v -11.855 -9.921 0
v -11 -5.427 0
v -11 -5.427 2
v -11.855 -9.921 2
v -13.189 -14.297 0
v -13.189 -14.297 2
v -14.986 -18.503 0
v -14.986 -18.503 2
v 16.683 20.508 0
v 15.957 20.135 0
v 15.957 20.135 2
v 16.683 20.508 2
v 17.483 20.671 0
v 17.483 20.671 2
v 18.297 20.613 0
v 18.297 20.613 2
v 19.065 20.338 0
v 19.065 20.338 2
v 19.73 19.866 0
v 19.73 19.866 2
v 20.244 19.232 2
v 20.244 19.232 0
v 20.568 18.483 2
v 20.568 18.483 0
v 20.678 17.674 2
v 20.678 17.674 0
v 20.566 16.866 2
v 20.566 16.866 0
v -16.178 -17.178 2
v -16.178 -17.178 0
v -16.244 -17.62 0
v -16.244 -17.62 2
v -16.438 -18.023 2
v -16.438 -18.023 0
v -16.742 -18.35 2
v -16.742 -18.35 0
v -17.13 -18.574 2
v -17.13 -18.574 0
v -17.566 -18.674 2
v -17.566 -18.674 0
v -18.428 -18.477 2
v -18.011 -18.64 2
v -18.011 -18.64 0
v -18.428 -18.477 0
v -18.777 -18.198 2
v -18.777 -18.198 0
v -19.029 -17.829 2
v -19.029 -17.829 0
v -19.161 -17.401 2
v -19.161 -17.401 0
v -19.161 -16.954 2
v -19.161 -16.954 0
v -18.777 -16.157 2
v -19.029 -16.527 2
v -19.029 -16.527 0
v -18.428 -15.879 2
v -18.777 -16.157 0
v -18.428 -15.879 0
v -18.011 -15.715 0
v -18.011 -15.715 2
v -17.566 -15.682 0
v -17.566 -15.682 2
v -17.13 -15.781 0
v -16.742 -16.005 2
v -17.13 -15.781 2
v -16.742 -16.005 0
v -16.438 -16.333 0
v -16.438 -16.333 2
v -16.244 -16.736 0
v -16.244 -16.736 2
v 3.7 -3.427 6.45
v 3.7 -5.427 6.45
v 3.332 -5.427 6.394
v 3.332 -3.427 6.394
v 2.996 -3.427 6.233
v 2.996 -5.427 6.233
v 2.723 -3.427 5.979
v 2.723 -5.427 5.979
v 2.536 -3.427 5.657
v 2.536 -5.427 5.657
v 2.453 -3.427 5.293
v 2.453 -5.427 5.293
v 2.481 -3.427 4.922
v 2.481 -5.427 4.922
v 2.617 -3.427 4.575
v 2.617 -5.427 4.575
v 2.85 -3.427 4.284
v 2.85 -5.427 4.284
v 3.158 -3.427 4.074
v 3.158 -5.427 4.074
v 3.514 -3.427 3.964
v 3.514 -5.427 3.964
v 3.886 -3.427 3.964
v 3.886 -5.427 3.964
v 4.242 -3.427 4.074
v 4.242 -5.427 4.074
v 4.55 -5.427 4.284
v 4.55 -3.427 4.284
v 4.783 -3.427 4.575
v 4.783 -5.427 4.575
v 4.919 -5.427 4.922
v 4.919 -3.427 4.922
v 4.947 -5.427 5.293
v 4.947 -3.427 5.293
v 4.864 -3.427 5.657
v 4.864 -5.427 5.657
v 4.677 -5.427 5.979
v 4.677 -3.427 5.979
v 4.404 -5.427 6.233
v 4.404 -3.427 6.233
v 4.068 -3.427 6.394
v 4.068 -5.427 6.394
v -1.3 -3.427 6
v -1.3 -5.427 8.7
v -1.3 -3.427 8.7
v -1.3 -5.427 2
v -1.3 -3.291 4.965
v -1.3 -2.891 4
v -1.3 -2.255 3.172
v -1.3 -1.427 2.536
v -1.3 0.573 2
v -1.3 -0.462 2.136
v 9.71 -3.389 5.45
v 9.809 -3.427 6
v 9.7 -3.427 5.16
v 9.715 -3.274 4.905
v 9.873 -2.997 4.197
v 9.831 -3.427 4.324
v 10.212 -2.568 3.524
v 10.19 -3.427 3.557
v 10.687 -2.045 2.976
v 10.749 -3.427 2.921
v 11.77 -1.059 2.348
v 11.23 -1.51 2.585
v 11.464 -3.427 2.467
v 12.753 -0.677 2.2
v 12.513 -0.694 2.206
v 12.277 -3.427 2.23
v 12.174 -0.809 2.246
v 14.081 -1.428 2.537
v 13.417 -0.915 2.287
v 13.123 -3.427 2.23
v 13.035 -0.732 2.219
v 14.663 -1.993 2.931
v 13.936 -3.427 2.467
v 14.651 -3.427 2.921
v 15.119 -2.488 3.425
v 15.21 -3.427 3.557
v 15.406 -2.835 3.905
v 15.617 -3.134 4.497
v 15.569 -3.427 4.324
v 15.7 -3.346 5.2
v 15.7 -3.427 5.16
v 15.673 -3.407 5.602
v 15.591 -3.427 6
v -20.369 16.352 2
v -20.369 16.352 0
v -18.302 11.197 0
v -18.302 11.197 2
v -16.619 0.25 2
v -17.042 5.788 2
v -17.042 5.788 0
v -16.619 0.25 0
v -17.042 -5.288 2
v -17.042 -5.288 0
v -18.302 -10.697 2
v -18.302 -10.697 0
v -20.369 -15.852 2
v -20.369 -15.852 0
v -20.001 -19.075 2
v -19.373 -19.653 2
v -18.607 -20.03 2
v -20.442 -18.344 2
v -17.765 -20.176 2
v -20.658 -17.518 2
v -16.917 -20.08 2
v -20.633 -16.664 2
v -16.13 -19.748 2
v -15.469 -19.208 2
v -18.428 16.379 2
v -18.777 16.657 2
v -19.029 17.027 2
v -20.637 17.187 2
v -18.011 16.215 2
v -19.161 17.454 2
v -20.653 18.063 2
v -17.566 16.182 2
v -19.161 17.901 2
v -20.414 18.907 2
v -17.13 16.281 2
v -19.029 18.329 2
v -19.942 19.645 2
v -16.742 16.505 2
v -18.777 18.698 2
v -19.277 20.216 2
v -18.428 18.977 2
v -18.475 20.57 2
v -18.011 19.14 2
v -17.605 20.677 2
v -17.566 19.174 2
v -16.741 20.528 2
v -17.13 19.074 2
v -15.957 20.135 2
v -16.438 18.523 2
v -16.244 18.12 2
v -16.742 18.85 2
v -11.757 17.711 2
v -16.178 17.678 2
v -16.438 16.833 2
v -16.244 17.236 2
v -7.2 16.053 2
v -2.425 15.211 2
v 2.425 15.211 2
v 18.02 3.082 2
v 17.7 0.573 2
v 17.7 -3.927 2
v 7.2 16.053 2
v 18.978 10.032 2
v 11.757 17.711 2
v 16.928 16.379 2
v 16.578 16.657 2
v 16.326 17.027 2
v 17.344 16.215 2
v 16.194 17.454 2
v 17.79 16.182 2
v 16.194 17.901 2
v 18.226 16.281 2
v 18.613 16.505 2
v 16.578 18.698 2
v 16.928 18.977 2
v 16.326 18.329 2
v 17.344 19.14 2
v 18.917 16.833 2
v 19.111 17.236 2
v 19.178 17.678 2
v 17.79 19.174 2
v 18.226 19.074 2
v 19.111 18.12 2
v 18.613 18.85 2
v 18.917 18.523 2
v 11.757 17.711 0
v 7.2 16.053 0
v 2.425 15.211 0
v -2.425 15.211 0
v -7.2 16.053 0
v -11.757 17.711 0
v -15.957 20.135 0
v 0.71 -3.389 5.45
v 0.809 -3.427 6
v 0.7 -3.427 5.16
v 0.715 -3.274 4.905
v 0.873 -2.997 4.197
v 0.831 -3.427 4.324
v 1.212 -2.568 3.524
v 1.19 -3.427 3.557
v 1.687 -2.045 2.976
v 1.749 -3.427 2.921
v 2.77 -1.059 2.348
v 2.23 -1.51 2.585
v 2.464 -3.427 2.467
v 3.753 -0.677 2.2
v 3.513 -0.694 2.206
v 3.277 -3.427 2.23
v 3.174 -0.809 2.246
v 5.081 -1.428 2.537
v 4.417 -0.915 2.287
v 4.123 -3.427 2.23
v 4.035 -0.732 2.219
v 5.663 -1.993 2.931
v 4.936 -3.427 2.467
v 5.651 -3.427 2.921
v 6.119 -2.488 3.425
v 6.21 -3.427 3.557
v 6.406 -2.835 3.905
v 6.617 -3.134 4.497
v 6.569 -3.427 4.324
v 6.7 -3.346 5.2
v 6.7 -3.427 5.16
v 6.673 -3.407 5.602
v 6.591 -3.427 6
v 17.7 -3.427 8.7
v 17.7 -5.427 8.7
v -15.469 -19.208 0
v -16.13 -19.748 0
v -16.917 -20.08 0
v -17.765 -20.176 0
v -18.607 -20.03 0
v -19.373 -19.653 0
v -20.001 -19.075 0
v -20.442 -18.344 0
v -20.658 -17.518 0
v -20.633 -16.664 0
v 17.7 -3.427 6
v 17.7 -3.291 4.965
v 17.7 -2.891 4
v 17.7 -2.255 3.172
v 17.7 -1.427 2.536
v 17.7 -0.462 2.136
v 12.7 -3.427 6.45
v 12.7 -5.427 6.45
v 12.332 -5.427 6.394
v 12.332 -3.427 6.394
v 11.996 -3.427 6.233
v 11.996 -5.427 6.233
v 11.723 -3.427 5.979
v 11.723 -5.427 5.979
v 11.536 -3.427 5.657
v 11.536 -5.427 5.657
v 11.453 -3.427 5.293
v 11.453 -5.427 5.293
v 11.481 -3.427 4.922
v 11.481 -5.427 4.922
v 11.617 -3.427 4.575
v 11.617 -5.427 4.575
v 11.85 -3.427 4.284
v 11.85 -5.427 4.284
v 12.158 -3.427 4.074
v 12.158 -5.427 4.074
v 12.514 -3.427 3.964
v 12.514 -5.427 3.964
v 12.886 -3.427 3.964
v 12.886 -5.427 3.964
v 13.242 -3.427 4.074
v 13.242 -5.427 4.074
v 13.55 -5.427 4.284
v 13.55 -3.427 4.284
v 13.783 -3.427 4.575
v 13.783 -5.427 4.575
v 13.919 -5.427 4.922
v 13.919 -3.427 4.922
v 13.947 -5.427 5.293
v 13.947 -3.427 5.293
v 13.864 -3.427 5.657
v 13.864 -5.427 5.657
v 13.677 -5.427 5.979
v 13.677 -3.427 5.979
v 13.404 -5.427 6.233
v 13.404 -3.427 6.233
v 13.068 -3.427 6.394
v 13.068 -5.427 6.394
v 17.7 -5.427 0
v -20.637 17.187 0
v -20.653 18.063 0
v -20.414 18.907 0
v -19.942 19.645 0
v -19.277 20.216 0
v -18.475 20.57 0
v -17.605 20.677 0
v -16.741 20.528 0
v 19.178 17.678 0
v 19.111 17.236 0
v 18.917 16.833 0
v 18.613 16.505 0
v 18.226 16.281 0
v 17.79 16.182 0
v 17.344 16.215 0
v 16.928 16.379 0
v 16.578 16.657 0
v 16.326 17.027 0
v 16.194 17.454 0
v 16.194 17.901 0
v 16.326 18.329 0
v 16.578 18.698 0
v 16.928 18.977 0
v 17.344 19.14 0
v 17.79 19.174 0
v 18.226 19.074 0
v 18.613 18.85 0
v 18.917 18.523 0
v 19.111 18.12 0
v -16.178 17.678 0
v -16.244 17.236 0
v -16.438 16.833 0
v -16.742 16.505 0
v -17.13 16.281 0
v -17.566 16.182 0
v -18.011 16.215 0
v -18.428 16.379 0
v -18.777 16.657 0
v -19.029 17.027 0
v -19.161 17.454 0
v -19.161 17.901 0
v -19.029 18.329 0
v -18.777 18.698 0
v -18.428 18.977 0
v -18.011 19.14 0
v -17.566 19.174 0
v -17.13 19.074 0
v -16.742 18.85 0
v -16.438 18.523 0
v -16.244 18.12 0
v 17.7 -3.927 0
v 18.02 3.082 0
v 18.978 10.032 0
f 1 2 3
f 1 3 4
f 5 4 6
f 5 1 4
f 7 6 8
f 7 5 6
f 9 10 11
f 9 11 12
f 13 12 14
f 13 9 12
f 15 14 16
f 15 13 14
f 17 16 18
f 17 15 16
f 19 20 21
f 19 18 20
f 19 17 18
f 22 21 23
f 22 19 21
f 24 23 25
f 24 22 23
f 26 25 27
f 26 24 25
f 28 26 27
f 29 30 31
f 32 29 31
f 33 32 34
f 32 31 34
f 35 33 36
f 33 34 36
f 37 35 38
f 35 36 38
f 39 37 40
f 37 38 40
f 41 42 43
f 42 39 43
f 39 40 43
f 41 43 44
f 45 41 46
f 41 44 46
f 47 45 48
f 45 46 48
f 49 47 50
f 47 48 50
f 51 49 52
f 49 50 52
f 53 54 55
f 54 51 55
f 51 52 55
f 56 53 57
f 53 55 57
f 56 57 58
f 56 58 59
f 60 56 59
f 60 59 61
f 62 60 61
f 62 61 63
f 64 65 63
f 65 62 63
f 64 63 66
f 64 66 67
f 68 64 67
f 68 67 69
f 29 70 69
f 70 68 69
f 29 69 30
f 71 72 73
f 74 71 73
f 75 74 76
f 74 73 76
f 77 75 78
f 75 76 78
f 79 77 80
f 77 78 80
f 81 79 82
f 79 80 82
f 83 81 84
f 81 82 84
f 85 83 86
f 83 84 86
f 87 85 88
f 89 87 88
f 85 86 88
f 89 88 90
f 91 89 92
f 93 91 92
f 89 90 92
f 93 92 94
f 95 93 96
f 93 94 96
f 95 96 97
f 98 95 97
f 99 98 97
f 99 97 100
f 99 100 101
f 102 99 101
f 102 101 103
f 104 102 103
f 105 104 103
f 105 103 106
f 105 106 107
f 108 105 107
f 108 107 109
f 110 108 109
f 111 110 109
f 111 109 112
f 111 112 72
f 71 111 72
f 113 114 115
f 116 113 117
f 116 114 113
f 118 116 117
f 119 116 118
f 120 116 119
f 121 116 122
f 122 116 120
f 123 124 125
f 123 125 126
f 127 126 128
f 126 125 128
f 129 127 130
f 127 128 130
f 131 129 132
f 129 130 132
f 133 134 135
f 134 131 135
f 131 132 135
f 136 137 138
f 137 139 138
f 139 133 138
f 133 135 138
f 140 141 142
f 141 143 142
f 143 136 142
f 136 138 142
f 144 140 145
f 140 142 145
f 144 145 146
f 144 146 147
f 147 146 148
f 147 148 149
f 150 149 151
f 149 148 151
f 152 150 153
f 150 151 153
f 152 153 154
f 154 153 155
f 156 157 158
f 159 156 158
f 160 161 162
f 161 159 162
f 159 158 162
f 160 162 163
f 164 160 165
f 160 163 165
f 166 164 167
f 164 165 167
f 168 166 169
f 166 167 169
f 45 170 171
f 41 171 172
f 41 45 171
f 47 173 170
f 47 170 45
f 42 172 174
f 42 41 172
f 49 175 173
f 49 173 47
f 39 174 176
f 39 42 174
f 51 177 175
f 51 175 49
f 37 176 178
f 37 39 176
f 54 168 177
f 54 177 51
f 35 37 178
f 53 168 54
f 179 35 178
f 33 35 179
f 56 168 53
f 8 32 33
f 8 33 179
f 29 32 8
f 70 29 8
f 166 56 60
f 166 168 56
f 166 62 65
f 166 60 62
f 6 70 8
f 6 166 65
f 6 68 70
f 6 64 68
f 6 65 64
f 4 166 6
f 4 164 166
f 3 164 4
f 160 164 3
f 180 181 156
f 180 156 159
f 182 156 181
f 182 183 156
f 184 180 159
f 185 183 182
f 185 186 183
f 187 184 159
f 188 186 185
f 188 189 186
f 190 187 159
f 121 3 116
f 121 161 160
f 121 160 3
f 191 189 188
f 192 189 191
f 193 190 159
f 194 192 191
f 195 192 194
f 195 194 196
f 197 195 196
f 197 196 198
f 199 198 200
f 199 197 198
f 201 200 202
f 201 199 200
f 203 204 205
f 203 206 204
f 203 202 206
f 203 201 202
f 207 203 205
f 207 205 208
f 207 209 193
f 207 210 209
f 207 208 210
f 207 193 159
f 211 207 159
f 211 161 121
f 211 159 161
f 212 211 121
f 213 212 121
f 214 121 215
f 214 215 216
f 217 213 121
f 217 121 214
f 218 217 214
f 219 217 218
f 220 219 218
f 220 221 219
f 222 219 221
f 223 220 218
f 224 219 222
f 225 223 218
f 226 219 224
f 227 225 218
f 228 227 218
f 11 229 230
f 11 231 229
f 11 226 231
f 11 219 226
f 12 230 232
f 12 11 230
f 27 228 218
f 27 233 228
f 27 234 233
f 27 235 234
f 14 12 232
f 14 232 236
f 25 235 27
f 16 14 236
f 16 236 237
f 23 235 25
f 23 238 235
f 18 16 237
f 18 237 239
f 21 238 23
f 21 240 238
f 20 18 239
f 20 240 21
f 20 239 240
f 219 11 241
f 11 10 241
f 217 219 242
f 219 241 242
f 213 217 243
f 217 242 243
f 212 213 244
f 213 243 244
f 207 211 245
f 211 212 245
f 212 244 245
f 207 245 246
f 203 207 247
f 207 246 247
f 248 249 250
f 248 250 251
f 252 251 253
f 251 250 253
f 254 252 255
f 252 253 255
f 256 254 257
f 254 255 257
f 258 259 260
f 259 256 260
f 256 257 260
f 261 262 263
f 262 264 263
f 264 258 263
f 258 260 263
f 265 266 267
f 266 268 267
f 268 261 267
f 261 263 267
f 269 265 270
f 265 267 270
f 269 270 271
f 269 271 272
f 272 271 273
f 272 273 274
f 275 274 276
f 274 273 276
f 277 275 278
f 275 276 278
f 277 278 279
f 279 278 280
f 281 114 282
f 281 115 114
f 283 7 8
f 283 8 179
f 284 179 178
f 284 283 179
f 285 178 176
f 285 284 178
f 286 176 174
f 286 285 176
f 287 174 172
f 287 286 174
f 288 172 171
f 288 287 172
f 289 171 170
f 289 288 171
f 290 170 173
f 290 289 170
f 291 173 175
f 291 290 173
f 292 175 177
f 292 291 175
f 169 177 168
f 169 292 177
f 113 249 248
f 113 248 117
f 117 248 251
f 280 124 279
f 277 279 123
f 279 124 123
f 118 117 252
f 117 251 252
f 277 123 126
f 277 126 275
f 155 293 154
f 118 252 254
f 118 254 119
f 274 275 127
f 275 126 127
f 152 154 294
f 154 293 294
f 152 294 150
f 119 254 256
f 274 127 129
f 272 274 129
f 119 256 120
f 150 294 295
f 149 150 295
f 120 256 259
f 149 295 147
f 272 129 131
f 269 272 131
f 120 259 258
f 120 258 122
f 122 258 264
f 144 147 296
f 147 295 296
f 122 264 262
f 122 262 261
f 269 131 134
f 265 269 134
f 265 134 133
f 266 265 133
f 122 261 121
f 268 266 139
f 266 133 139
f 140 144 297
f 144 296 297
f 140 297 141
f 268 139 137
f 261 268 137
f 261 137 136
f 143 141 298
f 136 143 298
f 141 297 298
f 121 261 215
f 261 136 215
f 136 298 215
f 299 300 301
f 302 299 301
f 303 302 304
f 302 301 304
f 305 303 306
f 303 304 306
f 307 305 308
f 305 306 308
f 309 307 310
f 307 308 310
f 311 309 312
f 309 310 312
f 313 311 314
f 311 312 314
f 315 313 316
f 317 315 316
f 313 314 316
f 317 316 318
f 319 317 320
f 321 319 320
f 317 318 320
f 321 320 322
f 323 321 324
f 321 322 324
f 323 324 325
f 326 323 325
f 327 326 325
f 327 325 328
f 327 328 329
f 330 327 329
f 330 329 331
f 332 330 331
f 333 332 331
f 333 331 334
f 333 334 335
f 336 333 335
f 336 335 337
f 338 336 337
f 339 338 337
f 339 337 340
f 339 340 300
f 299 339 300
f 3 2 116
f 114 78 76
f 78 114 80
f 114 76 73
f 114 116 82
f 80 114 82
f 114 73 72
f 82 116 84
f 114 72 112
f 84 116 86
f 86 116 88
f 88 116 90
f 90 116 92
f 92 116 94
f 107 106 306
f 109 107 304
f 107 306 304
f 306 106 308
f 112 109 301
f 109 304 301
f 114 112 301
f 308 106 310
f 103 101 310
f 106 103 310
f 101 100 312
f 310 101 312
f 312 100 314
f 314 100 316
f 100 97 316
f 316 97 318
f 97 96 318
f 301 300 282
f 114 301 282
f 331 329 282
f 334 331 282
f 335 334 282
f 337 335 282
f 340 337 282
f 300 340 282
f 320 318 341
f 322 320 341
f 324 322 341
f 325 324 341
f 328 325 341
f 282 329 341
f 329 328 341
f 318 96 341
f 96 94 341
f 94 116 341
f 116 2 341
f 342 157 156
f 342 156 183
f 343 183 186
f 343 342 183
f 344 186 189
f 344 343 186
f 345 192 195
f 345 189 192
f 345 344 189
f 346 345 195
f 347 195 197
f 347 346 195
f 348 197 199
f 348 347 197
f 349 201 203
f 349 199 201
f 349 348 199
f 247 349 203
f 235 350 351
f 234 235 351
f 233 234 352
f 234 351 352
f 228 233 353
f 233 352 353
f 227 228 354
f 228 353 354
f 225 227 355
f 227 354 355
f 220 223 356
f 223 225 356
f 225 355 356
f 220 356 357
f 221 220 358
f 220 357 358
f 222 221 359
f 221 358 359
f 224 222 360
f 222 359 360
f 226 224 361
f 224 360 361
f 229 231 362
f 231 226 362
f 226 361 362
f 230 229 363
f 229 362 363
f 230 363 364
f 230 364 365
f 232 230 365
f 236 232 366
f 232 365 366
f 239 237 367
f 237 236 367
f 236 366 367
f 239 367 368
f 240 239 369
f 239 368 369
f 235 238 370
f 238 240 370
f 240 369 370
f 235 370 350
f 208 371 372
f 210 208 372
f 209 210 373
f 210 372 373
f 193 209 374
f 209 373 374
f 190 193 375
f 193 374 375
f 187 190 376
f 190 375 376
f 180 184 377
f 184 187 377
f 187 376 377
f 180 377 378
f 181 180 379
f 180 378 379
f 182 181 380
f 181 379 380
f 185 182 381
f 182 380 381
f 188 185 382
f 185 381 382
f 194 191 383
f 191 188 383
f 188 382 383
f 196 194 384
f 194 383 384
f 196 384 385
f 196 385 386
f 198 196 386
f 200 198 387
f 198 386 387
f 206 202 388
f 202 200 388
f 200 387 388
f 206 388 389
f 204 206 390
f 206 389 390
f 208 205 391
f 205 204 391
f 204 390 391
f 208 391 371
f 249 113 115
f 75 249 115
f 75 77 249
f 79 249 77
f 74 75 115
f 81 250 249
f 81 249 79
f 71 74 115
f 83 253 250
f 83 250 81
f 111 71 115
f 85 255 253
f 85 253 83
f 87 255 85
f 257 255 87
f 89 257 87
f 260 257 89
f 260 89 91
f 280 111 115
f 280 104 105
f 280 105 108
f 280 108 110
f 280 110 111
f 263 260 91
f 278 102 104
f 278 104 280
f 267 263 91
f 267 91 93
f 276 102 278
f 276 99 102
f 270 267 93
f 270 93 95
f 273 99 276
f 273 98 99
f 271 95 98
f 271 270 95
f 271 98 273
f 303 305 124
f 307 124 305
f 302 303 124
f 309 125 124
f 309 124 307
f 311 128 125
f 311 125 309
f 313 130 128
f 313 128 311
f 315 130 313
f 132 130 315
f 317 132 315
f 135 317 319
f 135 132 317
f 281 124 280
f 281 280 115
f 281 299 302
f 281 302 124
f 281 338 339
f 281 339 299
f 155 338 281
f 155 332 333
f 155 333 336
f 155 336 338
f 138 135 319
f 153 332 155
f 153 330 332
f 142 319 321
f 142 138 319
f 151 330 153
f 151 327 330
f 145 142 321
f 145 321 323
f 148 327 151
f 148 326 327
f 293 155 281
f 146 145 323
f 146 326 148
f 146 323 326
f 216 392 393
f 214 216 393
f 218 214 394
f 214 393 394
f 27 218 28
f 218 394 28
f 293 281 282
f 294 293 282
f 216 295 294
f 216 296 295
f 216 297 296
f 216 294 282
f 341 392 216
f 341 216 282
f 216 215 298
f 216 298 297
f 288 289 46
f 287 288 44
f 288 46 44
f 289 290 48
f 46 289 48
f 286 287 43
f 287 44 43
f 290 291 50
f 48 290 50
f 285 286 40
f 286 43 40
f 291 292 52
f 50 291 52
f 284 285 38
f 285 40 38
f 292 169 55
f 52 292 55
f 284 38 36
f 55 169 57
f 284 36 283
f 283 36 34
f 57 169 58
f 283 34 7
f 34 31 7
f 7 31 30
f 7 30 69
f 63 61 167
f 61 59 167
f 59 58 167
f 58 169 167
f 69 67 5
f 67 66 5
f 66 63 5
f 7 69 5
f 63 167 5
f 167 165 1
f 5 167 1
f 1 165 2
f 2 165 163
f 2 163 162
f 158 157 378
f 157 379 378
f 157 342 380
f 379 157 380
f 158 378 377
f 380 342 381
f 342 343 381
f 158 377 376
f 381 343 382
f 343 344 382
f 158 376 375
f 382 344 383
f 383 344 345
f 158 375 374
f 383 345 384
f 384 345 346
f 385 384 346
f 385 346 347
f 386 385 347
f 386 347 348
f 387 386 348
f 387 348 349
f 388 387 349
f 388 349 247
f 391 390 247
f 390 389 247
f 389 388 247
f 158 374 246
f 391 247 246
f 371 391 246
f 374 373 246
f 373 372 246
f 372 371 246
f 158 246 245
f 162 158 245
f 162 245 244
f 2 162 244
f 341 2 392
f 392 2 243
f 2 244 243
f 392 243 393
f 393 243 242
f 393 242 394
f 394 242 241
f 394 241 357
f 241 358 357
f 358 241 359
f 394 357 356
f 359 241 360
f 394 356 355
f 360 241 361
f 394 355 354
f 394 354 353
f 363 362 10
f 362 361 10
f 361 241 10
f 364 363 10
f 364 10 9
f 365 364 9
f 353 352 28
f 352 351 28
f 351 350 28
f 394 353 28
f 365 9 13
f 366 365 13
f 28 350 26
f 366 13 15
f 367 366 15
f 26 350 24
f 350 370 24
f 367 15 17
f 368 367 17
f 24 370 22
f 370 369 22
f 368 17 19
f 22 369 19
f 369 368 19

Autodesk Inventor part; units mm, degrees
ref_plane "YZ Plane" through (0, 0, 0) normal (1, 0, 0) x (0, 1, 0)
ref_plane "XZ Plane" through (0, 0, 0) normal (0, 1, 0) x (-1, 0, 0)
ref_plane "Work Plane1" through (0, 0, 0) normal (0, 0, 1) x (1, 0, 0)
sketch "Sketch2" plane through (0, 0, 0) normal (0, 0, 1) x (1, 0, 0)
  circle A0 centre (-17.6777, 17.6777) radius 3 projected
  circle A1 centre (17.6777, 17.6777) radius 3 projected
  circle A2 centre (-17.6777, -17.1777) radius 3 projected
  line L0 (17.7, -5.427) -> (-1.3, -5.427) projected
  line L1 (-1.3, -5.427) -> (17.7, -5.427)
  line L2 (17.7, -5.427) -> (17.7, -3.927)
  line L3 (17.7, -3.927) -> (-1.3, -3.927)
  line L4 (-1.3, -3.927) -> (-1.3, -5.427)
  arc A3 (-15.9573, 20.1354) -> (15.9573, 20.1354) centre (0, 42.9323) ccw
  arc A4 (-20.3689, -15.8521) -> (-20.3689, 16.3521) centre (-53.0613, 0.25) ccw
  arc A5 (-14.9864, -18.5032) -> (-11, -5.427) centre (-53.0613, 0.25) ccw
  line L5 (-11, -5.427) -> (-1.3, -5.427)
  arc A6 (20.5658, 16.8661) -> (17.7, -3.927) centre (94.5659, -3.927) ccw
  circle A7 centre (-17.6777, 17.6777) radius 1.5
  circle A8 centre (17.6777, 17.6777) radius 1.5
  circle A9 centre (-17.6777, -17.1777) radius 1.5
  point P0 (0, 0)
  point P1 (-10.5, -5.427)
  dimension "d6" = 19
  dimension "d7" = 1.5
  dimension "d9" = 0.5
  dimension "d10" = 3
  dimension "d11" = 3
  dimension "d12" = 3
extrude "Extrusion1" add sketch "Sketch2" along normal blind 2
sketch "Sketch3" plane through (0, 0, 2) normal (0, 0, 1) x (1, 0, 0)
  line L0 (-11, -5.427) -> (17.7, -5.427) projected
  line L1 (17.7, -5.427) -> (-1.3, -5.427)
  line L2 (-1.3, -5.427) -> (-1.3, -3.427)
  line L3 (-1.3, -3.427) -> (17.7, -3.427)
  line L4 (17.7, -3.427) -> (17.7, -5.427)
  point P0 (0, 0)
  dimension "d15" = 19
  dimension "d16" = 2
ref_plane "Work Plane2" through (-1.3, -10.427, 8.7) normal (0, 0, 1) x (1, 0, 0)
extrude "Extrusion2" add sketch "Sketch3" along normal up to surface (6.7 mm away)
sketch "Sketch4" plane through (-1.3, -3.427, 2) normal (0, 1, 0) x (1, 0, 0)
  circle A0 centre (14, -3.2) radius 1.25 projected
  circle A1 centre (5, -3.2) radius 1.25 projected
  circle A2 centre (5, -3.2) radius 3
  circle A3 centre (14, -3.2) radius 3
  point P0 (1.3, 2)
  dimension "d20" = 6
  dimension "d21" = 6
fillet "Fillet1" radius 4 1 edges at (8.2, -3.427, 2)
extrude "Extrusion3" cut sketch "Sketch4" along normal blind 10 contours A0 | A1 | A2 | A3
hole "Hole1" at (3.7, -3.427, 5.2) direction (0, -1, 0) diameter 2.5 end through all
hole "Hole2" at (12.7, -3.427, 5.2) direction (0, -1, 0) diameter 2.5 end through all
properties part number "FanMount"
